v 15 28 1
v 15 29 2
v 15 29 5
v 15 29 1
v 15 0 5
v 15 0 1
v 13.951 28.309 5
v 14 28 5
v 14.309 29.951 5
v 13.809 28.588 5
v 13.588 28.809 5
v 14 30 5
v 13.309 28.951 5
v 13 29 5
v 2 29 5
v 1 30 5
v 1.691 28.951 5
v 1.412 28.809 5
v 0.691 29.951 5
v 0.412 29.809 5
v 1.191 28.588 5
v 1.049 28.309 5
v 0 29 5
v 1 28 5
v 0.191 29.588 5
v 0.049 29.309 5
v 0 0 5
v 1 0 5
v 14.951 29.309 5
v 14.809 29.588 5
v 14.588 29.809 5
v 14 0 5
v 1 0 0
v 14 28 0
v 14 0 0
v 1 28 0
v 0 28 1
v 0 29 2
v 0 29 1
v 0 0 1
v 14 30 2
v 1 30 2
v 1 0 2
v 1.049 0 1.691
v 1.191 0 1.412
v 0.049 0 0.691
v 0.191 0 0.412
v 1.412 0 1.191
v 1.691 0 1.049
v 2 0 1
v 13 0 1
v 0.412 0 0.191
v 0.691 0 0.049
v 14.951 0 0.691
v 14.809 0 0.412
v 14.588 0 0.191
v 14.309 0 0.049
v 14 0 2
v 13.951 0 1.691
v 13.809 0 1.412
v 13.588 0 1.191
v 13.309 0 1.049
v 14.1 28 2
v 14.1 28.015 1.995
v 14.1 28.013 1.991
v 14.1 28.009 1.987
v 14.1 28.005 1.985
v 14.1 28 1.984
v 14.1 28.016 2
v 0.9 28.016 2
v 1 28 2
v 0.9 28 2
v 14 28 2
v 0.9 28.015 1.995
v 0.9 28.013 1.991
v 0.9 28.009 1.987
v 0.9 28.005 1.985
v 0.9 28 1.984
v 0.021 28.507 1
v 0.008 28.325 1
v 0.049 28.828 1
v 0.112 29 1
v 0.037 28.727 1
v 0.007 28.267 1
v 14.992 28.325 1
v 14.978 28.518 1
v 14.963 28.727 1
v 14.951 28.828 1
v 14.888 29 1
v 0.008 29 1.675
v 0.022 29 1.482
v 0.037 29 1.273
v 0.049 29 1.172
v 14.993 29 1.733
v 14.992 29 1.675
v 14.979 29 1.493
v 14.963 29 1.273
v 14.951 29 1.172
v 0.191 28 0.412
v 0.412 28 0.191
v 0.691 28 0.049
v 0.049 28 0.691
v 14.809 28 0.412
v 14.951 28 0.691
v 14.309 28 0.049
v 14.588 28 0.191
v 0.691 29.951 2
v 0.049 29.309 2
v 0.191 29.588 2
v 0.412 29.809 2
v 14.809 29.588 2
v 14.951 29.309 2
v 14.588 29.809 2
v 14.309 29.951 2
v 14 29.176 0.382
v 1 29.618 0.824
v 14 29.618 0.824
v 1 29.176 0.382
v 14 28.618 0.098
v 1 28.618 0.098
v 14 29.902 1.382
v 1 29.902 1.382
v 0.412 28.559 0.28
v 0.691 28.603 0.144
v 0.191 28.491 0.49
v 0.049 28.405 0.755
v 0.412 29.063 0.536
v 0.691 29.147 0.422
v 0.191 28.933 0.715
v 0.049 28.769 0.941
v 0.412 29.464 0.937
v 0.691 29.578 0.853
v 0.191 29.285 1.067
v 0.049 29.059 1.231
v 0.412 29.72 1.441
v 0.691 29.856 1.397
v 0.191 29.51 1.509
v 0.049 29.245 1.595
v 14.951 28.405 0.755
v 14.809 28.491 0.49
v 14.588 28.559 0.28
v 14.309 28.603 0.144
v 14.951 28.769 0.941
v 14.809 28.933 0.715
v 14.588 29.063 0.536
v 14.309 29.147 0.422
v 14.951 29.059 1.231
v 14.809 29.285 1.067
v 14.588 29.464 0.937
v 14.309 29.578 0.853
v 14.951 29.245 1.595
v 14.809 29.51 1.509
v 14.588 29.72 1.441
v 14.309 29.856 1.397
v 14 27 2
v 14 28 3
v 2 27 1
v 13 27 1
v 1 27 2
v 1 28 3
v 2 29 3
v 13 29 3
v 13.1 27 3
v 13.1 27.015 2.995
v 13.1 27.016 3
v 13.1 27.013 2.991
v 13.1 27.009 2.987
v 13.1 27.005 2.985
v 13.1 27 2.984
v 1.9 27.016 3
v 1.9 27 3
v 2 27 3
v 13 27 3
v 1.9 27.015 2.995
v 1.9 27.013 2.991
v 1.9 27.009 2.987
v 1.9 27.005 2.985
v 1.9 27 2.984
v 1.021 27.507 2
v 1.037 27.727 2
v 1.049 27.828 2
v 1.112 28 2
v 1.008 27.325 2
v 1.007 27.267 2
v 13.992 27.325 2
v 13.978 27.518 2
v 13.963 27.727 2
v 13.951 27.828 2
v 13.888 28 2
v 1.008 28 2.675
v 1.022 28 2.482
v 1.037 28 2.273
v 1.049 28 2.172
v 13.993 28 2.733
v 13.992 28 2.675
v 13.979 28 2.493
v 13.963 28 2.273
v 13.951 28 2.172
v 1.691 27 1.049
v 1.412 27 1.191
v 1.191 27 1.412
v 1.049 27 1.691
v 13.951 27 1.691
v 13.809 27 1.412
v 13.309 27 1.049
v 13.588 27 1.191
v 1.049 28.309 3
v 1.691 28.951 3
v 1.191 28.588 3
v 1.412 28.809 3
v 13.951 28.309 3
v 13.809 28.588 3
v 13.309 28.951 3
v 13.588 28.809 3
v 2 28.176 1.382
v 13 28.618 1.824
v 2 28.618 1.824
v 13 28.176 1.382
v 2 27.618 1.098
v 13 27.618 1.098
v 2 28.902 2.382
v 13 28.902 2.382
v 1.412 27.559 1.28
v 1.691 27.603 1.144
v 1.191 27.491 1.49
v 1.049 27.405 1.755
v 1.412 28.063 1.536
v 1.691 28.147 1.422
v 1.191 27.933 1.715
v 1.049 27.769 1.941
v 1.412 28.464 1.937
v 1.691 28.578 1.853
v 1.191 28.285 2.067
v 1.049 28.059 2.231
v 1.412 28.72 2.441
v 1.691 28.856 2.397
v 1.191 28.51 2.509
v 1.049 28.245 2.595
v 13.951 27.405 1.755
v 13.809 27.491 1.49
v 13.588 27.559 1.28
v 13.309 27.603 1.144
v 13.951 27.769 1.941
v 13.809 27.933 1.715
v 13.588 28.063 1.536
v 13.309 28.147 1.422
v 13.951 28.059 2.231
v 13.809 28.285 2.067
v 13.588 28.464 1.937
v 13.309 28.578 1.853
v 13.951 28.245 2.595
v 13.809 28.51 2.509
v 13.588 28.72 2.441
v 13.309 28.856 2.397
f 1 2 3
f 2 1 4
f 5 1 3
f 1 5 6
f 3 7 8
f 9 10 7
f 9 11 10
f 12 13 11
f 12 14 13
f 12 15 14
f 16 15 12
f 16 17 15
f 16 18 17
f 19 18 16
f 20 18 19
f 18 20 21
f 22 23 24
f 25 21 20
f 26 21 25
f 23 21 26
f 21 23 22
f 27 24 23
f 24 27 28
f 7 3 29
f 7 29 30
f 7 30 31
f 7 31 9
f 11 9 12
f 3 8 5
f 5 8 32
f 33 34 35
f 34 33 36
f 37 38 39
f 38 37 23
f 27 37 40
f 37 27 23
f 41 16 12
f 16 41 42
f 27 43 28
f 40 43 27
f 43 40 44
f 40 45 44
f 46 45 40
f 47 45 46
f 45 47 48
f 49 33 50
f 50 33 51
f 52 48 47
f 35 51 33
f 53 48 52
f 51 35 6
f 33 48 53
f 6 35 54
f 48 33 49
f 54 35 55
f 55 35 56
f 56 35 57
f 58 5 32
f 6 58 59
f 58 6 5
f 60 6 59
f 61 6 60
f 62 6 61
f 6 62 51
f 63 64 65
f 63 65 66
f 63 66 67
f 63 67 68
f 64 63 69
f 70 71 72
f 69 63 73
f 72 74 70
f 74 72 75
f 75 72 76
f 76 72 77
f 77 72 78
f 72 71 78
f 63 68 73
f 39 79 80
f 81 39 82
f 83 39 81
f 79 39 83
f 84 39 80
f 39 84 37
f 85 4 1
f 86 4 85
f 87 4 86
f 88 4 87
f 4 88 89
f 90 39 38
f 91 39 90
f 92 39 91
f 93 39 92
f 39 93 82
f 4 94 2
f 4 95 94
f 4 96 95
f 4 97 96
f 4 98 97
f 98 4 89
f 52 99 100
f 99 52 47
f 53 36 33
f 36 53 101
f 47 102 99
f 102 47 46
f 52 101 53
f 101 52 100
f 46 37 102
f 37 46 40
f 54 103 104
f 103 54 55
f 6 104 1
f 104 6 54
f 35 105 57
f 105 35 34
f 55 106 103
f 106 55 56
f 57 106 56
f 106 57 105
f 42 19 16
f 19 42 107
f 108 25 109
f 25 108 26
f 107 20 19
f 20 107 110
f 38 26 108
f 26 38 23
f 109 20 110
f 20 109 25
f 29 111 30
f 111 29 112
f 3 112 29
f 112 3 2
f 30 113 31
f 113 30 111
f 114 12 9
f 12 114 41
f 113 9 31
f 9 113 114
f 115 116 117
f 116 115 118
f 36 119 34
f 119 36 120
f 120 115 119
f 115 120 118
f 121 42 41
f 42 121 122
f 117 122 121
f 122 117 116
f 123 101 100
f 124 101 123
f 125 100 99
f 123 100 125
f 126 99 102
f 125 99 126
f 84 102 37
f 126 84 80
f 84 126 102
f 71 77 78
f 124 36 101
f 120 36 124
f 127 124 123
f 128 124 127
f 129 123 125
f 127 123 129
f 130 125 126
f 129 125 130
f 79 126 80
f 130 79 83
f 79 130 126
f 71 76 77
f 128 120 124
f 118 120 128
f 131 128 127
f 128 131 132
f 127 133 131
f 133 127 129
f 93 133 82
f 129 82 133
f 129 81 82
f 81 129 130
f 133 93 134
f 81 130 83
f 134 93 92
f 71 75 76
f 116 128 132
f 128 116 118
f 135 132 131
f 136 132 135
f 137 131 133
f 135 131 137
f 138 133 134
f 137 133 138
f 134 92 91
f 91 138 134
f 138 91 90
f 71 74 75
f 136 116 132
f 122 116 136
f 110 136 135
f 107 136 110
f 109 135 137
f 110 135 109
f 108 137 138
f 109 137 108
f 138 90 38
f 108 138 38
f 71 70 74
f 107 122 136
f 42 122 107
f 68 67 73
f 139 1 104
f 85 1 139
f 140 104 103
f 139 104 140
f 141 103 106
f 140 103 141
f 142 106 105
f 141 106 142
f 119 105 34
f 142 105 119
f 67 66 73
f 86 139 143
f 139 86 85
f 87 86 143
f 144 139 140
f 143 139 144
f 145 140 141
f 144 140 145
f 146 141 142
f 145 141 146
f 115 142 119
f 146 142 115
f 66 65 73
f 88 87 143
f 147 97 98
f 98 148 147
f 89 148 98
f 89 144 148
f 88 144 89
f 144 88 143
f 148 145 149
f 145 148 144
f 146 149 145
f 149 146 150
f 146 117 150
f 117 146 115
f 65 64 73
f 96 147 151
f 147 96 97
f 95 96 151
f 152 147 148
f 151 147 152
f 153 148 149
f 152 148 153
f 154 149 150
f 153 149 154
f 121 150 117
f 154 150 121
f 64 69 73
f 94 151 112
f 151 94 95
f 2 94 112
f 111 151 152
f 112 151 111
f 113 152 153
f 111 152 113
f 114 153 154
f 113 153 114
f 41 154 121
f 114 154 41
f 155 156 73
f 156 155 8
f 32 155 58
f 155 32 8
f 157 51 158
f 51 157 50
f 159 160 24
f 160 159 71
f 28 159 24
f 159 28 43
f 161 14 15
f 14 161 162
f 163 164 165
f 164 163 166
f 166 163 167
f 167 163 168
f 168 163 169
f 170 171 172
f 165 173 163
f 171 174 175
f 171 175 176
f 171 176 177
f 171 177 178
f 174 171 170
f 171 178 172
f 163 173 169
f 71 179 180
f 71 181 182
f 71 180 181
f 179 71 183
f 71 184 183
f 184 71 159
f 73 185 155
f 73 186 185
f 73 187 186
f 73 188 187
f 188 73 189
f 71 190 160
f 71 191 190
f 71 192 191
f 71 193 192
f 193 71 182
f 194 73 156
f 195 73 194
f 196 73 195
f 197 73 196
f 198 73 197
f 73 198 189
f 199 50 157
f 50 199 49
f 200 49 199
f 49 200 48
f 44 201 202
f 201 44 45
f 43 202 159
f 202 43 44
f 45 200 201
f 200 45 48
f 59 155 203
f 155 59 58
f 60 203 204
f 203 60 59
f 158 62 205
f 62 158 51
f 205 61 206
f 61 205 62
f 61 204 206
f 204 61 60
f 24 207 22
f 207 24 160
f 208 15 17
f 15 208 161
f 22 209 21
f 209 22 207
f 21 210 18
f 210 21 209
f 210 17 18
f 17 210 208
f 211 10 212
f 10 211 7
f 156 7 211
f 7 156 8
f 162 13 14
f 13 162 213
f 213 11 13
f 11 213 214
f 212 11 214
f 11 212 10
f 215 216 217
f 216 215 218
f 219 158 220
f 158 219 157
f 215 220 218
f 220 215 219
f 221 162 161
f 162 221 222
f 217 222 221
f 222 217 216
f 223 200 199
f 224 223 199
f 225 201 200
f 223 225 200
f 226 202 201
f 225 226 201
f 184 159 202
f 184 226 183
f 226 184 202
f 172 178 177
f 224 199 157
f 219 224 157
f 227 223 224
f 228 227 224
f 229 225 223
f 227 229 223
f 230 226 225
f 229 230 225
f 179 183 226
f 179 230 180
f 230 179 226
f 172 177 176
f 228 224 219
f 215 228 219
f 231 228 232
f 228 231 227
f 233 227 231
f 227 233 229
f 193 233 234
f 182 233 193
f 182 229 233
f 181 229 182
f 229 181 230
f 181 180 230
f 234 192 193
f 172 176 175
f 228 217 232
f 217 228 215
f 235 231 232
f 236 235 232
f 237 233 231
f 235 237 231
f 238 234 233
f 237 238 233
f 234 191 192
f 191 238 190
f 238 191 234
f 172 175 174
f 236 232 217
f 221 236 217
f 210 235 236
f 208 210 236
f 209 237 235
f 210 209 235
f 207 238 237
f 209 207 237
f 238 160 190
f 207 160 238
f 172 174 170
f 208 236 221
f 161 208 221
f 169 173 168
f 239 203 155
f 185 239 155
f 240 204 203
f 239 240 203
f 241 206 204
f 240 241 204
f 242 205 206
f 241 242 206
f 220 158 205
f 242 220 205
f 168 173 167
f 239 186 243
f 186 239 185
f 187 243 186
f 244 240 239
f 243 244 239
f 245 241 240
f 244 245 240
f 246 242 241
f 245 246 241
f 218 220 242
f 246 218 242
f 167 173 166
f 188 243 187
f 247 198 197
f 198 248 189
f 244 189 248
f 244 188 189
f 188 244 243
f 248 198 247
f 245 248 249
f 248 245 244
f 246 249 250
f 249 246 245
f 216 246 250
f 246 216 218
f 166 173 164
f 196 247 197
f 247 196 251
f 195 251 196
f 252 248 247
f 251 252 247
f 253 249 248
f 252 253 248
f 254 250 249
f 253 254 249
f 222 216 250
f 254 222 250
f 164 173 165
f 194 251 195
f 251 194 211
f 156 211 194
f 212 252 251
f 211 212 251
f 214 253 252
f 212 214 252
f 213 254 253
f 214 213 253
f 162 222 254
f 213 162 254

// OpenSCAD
// Rounded Cover a part of CatS61 Clip
/* [Preview] */
preview="basic"; // [basic,plate]
$fn=20;

/* [Colors] */
colorCover="#010150";


module roundedCoverUp(w,d,h,r1,r2) {  // sirka, hlbka/dlzka, vyska/hrubka, polomer velkeho zaoblenia, polomer malych hran
    union() {                         // tato verzia vyzera byt z pohladu vyplnenia priastoru dokonala ...ale zere resourcy
    difference() {
        cube([w,d,h]);
        translate([-1,d-r1,h-r1])
            cube([w+2,r1+1,r1+1]);      // vyrez pre velke zaoblenie (vzadu hore)
        translate([-1,-1,h-r2])
            cube([r2+1,d+2,r2+1]);  // lavy horny vyrez pre okrajove zaoblenie
        translate([w-r2,-1,h-r2])
            cube([r2+1,d+2,r2+1]);  // pravy horny vyrez pre okrajove zaoblenie
        translate([-1,d-r2,-1])
            cube([r2+1,r2+1,h+2]);  // vyrez pre zaoblenie vlavo vzadu
        translate([w-r2,d-r2,-1])
            cube([r2+1,r2+1,h+2]);  // vyrez pre zaoblenie vpravo vzadu
    } // diff
        translate([r2,d-r1,h-r1])
            rotate([0,90,0])
            cylinder(h=w-2*r2,r=r1); // velke zaoblenie vzadu hore
        translate([r2,0,h-r2])
            rotate([-90,0,0])       // lave horne zaoblenie
            cylinder(h=d-r1,r=r2);
        translate([w-r2,0,h-r2])
            rotate([-90,0,0])       // prave horne zaoblenie
            cylinder(h=d-r1,r=r2);
        translate([r2,d-r2,0])
            cylinder(h=h-r1,r=r2);  // lave zadne zaoblenie
        translate([w-r2,d-r2,0])
            cylinder(h=h-r1,r=r2);  // prave zadne zaoblenie


        translate([r2,d-r1,h-r1])   // velke zaoblenie v lavom hornom rohu
            rotate([0,-90,0])
            //rotate_extrude(angle=90,start=0,convexity=100)
            rotate_extrude(angle=90,convexity=20)
                translate([r1-r2,0,0])
                circle(r=r2);

        translate([w-r2,d-r1,h-r1])   // velke zaoblenie v lavom hornom rohu
            rotate([0,-90,0])
            //rotate_extrude(angle=90,start=0,convexity=100)
            rotate_extrude(angle=90,convexity=20)
                translate([r1-r2,0,0])
                circle(r=r2);

        translate([0,d-r1,h-r1])  // vyplnenie dier na velkom zaobleni z oboch stran pomocou valca
            rotate([0,90,0])
            cylinder(h=w,r=r1-r2);
    } // union
}


module roundedCoverDown(w,d,h,r1,r2) {  // zaoblena krytka otocena dnom dole v zakladnej polohe
                                        //sirka,hlbka/dlzka,vyska/hrubka,polomer velkeho zaoblenia vzadu,polomer malych zaobleni po stranach
                                        // z pohladu komponent zjednodusena ...ovsem nedokonala verzia
    union() {
    difference() {
        cube([w,d,h]);             // zakladny kvader
        translate([r2-0.1,d-r1,-1])
            cube([w-2*r2+0.2,r1+1,r1+1]);  //vyrez pre velke zaoblenie

        translate([-1,-1,-1])
            cube([r2+1,d+2,r2+1]);  // lavy dolny vyrez
        translate([w-r2,-1,-1])
            cube([r2+1,d+2,r2+1]); //pravy dolny vyrez
        translate([-1,d-r2,-1])
            cube([r2+1,r2+1,h+2]);  // lavy zadny vyrez 
        translate([w-r2,d-r2,-1])
            cube([r2+1,r2+1,h+2]);  // lavy zadny vyrez 
        
    } //diff
        translate([r2,0,r2])
            rotate([-90,0,0])
            cylinder(h=d-r1,r=r2);  // lave dolne zaoblenie
        translate([w-r2,0,r2])
            rotate([-90,0,0])
            cylinder(h=d-r1,r=r2);  // prave dolne zaoblenie
        translate([r2,d-r2,r1])
            cylinder(h=h-r1,r=r2);  // lave zadne zaoblenie
        translate([w-r2,d-r2,r1])
            cylinder(h=h-r1,r=r2);  // prave zadne zaoblenie
        translate([r2,d-r1,r1])
            rotate([0,90,0])
            cylinder(h=w-2*r2,r=r1);  // zadne dolne velke zaoblenie


        translate([r2,d-r1,r1])   // velke zaoblenie v lavom hornom rohu
            rotate([0,90,0])
            //rotate_extrude(angle=90,start=0,convexity=100)
            rotate_extrude(angle=90,convexity=20)
                translate([r1-r2,0,0])
                circle(r=r2);

        translate([w-r2,d-r1,r1])   // velke zaoblenie v lavom hornom rohu
            rotate([0,90,0])
            //rotate_extrude(angle=90,start=0,convexity=100)
            rotate_extrude(angle=90,convexity=20)
                translate([r1-r2,0,0])
                circle(r=r2);

    } //union
}
if(preview=="basic") {

    difference() {
        translate([0,0,0])
            roundedCoverDown(15,30,5,2,1);
        translate([1,-1,1])
            roundedCoverDown(13,30,5,2,1);
    }
}
